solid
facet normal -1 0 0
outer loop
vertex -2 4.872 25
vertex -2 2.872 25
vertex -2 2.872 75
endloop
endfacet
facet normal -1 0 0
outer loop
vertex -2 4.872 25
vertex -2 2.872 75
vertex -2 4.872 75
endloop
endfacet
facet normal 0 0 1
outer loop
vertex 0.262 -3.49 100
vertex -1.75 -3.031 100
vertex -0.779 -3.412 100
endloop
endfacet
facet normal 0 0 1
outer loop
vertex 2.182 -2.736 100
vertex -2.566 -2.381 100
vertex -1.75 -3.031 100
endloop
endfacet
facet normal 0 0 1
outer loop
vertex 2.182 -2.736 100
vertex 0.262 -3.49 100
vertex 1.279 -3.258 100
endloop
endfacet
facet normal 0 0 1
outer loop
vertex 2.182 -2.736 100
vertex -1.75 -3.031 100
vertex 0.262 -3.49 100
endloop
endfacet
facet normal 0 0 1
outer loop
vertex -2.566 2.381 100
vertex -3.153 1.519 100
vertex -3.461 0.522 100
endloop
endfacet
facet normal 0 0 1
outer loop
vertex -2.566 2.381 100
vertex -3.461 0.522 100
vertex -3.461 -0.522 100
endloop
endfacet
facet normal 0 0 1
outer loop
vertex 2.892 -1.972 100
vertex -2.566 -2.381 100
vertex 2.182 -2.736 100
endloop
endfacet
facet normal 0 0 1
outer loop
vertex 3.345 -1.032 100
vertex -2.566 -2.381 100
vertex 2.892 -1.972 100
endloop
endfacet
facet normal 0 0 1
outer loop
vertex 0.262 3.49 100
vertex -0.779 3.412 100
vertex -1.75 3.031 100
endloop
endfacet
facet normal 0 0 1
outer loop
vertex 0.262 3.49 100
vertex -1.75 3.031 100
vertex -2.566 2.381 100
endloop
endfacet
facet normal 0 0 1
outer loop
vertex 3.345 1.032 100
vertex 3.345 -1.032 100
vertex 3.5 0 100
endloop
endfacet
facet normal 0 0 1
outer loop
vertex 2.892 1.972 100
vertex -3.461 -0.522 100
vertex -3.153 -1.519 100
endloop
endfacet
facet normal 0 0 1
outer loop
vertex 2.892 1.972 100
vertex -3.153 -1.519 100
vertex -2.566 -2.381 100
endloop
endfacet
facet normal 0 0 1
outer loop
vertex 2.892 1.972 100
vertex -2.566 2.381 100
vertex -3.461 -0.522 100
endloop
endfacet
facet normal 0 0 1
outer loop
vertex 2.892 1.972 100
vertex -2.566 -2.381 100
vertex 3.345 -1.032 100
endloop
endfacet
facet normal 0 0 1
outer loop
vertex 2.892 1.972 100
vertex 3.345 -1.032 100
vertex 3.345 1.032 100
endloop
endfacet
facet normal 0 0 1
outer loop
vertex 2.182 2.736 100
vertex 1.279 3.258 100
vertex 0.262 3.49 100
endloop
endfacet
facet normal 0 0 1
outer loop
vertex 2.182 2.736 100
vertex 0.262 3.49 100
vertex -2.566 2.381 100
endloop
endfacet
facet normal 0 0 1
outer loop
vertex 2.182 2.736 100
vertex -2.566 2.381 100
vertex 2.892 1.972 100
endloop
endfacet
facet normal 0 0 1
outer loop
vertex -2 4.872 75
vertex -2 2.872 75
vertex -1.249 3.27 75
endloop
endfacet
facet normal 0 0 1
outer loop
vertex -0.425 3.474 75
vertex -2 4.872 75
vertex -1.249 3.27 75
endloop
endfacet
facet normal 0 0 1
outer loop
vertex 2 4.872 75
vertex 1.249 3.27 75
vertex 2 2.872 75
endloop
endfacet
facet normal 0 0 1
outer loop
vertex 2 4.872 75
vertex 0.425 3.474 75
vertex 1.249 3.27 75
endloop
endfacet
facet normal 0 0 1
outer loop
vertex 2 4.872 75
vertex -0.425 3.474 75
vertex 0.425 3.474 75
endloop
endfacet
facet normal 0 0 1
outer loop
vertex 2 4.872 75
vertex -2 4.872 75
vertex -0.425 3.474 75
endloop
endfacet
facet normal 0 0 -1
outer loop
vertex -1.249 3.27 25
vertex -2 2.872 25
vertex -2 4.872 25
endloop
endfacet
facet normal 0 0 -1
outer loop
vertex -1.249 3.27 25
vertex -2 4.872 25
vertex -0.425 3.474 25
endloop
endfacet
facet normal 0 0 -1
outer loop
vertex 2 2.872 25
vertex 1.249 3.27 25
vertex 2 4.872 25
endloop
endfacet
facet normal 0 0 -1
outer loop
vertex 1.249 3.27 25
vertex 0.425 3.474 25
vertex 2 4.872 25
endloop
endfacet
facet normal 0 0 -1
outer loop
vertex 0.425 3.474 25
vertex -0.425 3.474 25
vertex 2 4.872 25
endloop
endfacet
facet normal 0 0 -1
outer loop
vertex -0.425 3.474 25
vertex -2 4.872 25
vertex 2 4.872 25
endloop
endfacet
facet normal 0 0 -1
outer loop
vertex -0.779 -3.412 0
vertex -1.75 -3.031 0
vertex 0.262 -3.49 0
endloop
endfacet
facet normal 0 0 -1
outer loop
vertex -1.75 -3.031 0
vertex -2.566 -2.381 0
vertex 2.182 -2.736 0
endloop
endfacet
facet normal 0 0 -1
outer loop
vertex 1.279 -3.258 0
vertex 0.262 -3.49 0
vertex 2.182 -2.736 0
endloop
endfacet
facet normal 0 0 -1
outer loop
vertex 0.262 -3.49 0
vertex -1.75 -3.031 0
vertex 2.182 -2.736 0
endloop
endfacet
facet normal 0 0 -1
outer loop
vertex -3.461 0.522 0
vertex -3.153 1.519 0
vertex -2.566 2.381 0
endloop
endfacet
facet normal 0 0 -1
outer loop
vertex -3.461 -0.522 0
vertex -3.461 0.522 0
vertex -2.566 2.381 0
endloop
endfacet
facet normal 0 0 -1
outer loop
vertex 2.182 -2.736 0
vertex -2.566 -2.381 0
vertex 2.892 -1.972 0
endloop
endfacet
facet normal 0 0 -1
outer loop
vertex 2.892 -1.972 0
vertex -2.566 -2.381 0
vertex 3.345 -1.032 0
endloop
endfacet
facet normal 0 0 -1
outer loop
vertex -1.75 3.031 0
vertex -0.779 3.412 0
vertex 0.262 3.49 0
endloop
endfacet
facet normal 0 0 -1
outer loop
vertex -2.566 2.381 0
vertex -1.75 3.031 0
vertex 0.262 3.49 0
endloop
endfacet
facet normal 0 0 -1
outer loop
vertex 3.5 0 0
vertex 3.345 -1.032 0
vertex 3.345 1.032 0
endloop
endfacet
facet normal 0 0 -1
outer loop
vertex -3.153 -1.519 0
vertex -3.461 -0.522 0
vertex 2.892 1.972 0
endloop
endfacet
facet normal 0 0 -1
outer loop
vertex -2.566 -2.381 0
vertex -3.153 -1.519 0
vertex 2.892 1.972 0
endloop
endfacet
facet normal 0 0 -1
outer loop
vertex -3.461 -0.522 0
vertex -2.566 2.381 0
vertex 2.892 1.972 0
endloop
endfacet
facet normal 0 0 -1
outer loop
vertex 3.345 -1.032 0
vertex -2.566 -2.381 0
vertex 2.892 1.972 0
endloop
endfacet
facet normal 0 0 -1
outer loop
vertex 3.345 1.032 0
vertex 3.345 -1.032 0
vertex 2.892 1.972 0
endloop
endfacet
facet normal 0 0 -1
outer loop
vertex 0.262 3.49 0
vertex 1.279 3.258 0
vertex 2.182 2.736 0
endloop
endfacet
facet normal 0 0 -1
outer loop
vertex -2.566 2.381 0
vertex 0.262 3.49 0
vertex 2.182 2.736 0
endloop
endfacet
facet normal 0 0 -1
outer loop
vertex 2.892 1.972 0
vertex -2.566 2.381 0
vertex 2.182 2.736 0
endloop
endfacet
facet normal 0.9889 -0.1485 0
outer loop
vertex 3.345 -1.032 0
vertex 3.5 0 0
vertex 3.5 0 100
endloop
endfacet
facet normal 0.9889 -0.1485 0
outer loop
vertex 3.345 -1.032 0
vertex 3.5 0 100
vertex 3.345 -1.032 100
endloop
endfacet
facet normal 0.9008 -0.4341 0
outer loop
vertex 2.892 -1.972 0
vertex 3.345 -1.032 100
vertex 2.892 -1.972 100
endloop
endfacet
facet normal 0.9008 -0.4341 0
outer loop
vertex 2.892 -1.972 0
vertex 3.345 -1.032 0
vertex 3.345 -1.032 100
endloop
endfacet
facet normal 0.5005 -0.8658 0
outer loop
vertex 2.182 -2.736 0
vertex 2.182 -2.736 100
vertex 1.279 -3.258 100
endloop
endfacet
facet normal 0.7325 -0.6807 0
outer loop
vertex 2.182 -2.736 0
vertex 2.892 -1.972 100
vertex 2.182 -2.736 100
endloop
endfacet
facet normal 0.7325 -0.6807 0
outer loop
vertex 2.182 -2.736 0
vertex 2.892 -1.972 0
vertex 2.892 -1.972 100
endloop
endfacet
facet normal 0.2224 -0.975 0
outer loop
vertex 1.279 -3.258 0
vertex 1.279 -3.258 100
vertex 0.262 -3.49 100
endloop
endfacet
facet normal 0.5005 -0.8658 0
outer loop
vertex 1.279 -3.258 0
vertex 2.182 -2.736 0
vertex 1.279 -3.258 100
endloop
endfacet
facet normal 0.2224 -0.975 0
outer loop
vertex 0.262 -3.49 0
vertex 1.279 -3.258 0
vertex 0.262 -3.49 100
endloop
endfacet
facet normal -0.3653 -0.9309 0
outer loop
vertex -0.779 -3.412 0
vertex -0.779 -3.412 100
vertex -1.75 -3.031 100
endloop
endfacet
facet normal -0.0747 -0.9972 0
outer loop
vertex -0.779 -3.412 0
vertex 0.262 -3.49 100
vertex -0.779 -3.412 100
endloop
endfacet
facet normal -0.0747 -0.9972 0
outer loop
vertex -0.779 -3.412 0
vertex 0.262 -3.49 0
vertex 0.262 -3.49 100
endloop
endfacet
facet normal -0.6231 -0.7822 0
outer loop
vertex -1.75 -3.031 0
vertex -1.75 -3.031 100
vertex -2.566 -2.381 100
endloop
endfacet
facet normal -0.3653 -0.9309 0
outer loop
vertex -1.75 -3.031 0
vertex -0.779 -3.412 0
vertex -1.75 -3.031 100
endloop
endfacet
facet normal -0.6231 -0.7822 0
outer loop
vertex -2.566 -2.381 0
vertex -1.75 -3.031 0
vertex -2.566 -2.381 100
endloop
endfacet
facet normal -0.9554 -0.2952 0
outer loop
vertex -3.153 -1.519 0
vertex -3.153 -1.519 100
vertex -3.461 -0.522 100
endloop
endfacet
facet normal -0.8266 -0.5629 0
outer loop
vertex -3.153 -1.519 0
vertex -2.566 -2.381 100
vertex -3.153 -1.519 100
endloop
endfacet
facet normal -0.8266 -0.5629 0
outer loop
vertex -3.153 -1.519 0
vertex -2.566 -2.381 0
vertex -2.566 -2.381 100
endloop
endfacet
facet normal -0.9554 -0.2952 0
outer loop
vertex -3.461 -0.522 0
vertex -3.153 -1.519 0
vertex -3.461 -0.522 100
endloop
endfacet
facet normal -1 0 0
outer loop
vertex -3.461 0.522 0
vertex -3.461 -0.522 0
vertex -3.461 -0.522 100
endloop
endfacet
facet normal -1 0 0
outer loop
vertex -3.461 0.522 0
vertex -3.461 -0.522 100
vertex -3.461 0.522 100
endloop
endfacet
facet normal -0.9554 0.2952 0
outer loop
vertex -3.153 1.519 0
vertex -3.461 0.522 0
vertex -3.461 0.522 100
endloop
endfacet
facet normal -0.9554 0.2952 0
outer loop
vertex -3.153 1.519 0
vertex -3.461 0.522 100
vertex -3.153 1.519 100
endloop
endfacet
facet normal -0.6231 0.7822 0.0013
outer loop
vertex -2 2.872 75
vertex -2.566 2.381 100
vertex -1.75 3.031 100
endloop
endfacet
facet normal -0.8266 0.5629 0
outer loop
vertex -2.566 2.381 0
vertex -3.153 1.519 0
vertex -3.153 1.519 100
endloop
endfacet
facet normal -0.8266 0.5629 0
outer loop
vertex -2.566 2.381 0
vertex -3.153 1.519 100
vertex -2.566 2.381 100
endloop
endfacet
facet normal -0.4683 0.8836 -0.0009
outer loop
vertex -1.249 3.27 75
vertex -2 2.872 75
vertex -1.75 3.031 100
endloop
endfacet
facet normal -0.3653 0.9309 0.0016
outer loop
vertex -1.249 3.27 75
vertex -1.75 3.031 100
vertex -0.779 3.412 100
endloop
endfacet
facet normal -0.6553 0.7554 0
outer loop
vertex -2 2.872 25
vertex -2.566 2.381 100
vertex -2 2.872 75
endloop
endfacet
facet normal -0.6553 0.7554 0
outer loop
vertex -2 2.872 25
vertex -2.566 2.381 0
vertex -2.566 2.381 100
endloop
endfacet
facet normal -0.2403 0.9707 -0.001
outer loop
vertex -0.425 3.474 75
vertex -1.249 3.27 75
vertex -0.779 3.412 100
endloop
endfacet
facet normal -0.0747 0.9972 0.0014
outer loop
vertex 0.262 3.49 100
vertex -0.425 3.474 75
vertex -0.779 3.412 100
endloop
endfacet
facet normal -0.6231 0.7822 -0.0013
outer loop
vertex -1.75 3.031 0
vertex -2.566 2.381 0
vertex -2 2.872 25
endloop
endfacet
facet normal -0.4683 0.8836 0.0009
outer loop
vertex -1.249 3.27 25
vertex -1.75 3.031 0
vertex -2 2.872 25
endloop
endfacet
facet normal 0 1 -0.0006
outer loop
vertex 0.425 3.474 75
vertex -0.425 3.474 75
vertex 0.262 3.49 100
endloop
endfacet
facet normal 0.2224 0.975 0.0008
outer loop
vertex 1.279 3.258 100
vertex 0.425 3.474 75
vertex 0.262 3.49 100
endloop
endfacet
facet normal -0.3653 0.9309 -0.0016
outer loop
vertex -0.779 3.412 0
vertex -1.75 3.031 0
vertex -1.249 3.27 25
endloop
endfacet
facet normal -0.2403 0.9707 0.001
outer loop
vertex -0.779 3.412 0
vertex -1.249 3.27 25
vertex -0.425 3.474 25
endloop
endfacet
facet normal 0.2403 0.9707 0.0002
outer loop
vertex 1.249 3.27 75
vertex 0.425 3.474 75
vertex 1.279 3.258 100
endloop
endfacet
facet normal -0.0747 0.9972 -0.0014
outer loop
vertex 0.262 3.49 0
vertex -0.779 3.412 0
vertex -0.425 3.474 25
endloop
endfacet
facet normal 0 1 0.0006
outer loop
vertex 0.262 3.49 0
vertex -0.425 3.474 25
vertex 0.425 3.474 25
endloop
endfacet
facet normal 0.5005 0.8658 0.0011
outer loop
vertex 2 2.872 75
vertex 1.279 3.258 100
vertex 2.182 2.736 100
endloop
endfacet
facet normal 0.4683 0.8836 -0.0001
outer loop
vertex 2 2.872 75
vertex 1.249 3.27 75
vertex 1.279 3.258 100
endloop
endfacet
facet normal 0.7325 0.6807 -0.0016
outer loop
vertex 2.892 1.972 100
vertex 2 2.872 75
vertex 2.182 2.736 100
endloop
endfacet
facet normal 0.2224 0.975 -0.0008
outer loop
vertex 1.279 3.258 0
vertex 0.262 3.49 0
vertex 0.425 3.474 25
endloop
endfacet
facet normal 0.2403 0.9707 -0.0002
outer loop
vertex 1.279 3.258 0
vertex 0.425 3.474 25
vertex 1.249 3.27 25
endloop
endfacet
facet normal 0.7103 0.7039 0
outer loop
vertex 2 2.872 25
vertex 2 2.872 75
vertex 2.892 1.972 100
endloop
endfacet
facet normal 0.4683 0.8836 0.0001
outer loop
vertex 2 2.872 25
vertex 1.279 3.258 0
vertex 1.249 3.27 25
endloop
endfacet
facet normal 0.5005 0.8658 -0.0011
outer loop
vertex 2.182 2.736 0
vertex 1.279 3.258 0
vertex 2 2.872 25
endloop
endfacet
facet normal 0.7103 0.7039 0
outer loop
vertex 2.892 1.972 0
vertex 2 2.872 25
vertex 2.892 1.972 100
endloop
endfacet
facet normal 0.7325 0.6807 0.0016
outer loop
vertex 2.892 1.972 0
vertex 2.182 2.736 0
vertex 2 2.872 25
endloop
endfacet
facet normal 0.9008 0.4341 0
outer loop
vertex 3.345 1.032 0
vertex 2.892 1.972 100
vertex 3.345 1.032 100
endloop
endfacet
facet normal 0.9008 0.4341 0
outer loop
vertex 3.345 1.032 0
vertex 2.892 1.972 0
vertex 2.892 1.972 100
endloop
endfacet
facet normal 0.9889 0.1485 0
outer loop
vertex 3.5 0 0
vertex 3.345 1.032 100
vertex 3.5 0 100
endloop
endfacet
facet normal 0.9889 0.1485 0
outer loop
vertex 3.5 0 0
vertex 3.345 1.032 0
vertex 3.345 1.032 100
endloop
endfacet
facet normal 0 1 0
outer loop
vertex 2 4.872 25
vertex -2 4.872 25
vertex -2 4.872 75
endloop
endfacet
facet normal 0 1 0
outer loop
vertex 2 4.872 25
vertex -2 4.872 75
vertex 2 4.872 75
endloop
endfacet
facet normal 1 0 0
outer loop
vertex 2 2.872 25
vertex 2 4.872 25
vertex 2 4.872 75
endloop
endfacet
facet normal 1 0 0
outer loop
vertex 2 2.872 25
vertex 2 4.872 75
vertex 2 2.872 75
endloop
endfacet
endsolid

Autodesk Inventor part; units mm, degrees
ref_plane "YZ Plane" through (0, 0, 0) normal (1, 0, 0) x (0, 1, 0)
ref_plane "XZ Plane" through (0, 0, 0) normal (0, 1, 0) x (-1, 0, 0)
sketch "Sketch1" plane through (0, 0, 0) normal (0, 0, 1) x (1, 0, 0)
  circle A0 centre (0, 0) radius 3.5
  dimension "d0" = 7
extrude "Extrusion1" add sketch "Sketch1" along normal blind 100
ref_plane "Work Plane1" through (0, 0, 50) normal (0, 0, 1) x (1, 0, 0)
sketch "Sketch2" plane through (0, 0, 50) normal (0, 0, 1) x (1, 0, 0)
  circle A0 centre (0, 0) radius 3.5 projected
  line L0 (-2, 2.8723) -> (-2, 4.8723)
  line L1 (-2, 4.8723) -> (2, 4.8723)
  line L2 (2, 4.8723) -> (2, 2.8723)
  circle A1 centre (0, 0) radius 3.5 projected
  arc A2 (2, 2.8723) -> (-2, 2.8723) centre (0, 0) ccw
  circle A3 centre (0, 0) radius 3.5 projected
  point P0 (0, 4.8723)
  dimension "d4" = 4
  dimension "d5" = 2
extrude "Extrusion2" add sketch "Sketch2" along normal mid plane 50 contours A0 L0 L1 L2
properties part number "shaft2"
